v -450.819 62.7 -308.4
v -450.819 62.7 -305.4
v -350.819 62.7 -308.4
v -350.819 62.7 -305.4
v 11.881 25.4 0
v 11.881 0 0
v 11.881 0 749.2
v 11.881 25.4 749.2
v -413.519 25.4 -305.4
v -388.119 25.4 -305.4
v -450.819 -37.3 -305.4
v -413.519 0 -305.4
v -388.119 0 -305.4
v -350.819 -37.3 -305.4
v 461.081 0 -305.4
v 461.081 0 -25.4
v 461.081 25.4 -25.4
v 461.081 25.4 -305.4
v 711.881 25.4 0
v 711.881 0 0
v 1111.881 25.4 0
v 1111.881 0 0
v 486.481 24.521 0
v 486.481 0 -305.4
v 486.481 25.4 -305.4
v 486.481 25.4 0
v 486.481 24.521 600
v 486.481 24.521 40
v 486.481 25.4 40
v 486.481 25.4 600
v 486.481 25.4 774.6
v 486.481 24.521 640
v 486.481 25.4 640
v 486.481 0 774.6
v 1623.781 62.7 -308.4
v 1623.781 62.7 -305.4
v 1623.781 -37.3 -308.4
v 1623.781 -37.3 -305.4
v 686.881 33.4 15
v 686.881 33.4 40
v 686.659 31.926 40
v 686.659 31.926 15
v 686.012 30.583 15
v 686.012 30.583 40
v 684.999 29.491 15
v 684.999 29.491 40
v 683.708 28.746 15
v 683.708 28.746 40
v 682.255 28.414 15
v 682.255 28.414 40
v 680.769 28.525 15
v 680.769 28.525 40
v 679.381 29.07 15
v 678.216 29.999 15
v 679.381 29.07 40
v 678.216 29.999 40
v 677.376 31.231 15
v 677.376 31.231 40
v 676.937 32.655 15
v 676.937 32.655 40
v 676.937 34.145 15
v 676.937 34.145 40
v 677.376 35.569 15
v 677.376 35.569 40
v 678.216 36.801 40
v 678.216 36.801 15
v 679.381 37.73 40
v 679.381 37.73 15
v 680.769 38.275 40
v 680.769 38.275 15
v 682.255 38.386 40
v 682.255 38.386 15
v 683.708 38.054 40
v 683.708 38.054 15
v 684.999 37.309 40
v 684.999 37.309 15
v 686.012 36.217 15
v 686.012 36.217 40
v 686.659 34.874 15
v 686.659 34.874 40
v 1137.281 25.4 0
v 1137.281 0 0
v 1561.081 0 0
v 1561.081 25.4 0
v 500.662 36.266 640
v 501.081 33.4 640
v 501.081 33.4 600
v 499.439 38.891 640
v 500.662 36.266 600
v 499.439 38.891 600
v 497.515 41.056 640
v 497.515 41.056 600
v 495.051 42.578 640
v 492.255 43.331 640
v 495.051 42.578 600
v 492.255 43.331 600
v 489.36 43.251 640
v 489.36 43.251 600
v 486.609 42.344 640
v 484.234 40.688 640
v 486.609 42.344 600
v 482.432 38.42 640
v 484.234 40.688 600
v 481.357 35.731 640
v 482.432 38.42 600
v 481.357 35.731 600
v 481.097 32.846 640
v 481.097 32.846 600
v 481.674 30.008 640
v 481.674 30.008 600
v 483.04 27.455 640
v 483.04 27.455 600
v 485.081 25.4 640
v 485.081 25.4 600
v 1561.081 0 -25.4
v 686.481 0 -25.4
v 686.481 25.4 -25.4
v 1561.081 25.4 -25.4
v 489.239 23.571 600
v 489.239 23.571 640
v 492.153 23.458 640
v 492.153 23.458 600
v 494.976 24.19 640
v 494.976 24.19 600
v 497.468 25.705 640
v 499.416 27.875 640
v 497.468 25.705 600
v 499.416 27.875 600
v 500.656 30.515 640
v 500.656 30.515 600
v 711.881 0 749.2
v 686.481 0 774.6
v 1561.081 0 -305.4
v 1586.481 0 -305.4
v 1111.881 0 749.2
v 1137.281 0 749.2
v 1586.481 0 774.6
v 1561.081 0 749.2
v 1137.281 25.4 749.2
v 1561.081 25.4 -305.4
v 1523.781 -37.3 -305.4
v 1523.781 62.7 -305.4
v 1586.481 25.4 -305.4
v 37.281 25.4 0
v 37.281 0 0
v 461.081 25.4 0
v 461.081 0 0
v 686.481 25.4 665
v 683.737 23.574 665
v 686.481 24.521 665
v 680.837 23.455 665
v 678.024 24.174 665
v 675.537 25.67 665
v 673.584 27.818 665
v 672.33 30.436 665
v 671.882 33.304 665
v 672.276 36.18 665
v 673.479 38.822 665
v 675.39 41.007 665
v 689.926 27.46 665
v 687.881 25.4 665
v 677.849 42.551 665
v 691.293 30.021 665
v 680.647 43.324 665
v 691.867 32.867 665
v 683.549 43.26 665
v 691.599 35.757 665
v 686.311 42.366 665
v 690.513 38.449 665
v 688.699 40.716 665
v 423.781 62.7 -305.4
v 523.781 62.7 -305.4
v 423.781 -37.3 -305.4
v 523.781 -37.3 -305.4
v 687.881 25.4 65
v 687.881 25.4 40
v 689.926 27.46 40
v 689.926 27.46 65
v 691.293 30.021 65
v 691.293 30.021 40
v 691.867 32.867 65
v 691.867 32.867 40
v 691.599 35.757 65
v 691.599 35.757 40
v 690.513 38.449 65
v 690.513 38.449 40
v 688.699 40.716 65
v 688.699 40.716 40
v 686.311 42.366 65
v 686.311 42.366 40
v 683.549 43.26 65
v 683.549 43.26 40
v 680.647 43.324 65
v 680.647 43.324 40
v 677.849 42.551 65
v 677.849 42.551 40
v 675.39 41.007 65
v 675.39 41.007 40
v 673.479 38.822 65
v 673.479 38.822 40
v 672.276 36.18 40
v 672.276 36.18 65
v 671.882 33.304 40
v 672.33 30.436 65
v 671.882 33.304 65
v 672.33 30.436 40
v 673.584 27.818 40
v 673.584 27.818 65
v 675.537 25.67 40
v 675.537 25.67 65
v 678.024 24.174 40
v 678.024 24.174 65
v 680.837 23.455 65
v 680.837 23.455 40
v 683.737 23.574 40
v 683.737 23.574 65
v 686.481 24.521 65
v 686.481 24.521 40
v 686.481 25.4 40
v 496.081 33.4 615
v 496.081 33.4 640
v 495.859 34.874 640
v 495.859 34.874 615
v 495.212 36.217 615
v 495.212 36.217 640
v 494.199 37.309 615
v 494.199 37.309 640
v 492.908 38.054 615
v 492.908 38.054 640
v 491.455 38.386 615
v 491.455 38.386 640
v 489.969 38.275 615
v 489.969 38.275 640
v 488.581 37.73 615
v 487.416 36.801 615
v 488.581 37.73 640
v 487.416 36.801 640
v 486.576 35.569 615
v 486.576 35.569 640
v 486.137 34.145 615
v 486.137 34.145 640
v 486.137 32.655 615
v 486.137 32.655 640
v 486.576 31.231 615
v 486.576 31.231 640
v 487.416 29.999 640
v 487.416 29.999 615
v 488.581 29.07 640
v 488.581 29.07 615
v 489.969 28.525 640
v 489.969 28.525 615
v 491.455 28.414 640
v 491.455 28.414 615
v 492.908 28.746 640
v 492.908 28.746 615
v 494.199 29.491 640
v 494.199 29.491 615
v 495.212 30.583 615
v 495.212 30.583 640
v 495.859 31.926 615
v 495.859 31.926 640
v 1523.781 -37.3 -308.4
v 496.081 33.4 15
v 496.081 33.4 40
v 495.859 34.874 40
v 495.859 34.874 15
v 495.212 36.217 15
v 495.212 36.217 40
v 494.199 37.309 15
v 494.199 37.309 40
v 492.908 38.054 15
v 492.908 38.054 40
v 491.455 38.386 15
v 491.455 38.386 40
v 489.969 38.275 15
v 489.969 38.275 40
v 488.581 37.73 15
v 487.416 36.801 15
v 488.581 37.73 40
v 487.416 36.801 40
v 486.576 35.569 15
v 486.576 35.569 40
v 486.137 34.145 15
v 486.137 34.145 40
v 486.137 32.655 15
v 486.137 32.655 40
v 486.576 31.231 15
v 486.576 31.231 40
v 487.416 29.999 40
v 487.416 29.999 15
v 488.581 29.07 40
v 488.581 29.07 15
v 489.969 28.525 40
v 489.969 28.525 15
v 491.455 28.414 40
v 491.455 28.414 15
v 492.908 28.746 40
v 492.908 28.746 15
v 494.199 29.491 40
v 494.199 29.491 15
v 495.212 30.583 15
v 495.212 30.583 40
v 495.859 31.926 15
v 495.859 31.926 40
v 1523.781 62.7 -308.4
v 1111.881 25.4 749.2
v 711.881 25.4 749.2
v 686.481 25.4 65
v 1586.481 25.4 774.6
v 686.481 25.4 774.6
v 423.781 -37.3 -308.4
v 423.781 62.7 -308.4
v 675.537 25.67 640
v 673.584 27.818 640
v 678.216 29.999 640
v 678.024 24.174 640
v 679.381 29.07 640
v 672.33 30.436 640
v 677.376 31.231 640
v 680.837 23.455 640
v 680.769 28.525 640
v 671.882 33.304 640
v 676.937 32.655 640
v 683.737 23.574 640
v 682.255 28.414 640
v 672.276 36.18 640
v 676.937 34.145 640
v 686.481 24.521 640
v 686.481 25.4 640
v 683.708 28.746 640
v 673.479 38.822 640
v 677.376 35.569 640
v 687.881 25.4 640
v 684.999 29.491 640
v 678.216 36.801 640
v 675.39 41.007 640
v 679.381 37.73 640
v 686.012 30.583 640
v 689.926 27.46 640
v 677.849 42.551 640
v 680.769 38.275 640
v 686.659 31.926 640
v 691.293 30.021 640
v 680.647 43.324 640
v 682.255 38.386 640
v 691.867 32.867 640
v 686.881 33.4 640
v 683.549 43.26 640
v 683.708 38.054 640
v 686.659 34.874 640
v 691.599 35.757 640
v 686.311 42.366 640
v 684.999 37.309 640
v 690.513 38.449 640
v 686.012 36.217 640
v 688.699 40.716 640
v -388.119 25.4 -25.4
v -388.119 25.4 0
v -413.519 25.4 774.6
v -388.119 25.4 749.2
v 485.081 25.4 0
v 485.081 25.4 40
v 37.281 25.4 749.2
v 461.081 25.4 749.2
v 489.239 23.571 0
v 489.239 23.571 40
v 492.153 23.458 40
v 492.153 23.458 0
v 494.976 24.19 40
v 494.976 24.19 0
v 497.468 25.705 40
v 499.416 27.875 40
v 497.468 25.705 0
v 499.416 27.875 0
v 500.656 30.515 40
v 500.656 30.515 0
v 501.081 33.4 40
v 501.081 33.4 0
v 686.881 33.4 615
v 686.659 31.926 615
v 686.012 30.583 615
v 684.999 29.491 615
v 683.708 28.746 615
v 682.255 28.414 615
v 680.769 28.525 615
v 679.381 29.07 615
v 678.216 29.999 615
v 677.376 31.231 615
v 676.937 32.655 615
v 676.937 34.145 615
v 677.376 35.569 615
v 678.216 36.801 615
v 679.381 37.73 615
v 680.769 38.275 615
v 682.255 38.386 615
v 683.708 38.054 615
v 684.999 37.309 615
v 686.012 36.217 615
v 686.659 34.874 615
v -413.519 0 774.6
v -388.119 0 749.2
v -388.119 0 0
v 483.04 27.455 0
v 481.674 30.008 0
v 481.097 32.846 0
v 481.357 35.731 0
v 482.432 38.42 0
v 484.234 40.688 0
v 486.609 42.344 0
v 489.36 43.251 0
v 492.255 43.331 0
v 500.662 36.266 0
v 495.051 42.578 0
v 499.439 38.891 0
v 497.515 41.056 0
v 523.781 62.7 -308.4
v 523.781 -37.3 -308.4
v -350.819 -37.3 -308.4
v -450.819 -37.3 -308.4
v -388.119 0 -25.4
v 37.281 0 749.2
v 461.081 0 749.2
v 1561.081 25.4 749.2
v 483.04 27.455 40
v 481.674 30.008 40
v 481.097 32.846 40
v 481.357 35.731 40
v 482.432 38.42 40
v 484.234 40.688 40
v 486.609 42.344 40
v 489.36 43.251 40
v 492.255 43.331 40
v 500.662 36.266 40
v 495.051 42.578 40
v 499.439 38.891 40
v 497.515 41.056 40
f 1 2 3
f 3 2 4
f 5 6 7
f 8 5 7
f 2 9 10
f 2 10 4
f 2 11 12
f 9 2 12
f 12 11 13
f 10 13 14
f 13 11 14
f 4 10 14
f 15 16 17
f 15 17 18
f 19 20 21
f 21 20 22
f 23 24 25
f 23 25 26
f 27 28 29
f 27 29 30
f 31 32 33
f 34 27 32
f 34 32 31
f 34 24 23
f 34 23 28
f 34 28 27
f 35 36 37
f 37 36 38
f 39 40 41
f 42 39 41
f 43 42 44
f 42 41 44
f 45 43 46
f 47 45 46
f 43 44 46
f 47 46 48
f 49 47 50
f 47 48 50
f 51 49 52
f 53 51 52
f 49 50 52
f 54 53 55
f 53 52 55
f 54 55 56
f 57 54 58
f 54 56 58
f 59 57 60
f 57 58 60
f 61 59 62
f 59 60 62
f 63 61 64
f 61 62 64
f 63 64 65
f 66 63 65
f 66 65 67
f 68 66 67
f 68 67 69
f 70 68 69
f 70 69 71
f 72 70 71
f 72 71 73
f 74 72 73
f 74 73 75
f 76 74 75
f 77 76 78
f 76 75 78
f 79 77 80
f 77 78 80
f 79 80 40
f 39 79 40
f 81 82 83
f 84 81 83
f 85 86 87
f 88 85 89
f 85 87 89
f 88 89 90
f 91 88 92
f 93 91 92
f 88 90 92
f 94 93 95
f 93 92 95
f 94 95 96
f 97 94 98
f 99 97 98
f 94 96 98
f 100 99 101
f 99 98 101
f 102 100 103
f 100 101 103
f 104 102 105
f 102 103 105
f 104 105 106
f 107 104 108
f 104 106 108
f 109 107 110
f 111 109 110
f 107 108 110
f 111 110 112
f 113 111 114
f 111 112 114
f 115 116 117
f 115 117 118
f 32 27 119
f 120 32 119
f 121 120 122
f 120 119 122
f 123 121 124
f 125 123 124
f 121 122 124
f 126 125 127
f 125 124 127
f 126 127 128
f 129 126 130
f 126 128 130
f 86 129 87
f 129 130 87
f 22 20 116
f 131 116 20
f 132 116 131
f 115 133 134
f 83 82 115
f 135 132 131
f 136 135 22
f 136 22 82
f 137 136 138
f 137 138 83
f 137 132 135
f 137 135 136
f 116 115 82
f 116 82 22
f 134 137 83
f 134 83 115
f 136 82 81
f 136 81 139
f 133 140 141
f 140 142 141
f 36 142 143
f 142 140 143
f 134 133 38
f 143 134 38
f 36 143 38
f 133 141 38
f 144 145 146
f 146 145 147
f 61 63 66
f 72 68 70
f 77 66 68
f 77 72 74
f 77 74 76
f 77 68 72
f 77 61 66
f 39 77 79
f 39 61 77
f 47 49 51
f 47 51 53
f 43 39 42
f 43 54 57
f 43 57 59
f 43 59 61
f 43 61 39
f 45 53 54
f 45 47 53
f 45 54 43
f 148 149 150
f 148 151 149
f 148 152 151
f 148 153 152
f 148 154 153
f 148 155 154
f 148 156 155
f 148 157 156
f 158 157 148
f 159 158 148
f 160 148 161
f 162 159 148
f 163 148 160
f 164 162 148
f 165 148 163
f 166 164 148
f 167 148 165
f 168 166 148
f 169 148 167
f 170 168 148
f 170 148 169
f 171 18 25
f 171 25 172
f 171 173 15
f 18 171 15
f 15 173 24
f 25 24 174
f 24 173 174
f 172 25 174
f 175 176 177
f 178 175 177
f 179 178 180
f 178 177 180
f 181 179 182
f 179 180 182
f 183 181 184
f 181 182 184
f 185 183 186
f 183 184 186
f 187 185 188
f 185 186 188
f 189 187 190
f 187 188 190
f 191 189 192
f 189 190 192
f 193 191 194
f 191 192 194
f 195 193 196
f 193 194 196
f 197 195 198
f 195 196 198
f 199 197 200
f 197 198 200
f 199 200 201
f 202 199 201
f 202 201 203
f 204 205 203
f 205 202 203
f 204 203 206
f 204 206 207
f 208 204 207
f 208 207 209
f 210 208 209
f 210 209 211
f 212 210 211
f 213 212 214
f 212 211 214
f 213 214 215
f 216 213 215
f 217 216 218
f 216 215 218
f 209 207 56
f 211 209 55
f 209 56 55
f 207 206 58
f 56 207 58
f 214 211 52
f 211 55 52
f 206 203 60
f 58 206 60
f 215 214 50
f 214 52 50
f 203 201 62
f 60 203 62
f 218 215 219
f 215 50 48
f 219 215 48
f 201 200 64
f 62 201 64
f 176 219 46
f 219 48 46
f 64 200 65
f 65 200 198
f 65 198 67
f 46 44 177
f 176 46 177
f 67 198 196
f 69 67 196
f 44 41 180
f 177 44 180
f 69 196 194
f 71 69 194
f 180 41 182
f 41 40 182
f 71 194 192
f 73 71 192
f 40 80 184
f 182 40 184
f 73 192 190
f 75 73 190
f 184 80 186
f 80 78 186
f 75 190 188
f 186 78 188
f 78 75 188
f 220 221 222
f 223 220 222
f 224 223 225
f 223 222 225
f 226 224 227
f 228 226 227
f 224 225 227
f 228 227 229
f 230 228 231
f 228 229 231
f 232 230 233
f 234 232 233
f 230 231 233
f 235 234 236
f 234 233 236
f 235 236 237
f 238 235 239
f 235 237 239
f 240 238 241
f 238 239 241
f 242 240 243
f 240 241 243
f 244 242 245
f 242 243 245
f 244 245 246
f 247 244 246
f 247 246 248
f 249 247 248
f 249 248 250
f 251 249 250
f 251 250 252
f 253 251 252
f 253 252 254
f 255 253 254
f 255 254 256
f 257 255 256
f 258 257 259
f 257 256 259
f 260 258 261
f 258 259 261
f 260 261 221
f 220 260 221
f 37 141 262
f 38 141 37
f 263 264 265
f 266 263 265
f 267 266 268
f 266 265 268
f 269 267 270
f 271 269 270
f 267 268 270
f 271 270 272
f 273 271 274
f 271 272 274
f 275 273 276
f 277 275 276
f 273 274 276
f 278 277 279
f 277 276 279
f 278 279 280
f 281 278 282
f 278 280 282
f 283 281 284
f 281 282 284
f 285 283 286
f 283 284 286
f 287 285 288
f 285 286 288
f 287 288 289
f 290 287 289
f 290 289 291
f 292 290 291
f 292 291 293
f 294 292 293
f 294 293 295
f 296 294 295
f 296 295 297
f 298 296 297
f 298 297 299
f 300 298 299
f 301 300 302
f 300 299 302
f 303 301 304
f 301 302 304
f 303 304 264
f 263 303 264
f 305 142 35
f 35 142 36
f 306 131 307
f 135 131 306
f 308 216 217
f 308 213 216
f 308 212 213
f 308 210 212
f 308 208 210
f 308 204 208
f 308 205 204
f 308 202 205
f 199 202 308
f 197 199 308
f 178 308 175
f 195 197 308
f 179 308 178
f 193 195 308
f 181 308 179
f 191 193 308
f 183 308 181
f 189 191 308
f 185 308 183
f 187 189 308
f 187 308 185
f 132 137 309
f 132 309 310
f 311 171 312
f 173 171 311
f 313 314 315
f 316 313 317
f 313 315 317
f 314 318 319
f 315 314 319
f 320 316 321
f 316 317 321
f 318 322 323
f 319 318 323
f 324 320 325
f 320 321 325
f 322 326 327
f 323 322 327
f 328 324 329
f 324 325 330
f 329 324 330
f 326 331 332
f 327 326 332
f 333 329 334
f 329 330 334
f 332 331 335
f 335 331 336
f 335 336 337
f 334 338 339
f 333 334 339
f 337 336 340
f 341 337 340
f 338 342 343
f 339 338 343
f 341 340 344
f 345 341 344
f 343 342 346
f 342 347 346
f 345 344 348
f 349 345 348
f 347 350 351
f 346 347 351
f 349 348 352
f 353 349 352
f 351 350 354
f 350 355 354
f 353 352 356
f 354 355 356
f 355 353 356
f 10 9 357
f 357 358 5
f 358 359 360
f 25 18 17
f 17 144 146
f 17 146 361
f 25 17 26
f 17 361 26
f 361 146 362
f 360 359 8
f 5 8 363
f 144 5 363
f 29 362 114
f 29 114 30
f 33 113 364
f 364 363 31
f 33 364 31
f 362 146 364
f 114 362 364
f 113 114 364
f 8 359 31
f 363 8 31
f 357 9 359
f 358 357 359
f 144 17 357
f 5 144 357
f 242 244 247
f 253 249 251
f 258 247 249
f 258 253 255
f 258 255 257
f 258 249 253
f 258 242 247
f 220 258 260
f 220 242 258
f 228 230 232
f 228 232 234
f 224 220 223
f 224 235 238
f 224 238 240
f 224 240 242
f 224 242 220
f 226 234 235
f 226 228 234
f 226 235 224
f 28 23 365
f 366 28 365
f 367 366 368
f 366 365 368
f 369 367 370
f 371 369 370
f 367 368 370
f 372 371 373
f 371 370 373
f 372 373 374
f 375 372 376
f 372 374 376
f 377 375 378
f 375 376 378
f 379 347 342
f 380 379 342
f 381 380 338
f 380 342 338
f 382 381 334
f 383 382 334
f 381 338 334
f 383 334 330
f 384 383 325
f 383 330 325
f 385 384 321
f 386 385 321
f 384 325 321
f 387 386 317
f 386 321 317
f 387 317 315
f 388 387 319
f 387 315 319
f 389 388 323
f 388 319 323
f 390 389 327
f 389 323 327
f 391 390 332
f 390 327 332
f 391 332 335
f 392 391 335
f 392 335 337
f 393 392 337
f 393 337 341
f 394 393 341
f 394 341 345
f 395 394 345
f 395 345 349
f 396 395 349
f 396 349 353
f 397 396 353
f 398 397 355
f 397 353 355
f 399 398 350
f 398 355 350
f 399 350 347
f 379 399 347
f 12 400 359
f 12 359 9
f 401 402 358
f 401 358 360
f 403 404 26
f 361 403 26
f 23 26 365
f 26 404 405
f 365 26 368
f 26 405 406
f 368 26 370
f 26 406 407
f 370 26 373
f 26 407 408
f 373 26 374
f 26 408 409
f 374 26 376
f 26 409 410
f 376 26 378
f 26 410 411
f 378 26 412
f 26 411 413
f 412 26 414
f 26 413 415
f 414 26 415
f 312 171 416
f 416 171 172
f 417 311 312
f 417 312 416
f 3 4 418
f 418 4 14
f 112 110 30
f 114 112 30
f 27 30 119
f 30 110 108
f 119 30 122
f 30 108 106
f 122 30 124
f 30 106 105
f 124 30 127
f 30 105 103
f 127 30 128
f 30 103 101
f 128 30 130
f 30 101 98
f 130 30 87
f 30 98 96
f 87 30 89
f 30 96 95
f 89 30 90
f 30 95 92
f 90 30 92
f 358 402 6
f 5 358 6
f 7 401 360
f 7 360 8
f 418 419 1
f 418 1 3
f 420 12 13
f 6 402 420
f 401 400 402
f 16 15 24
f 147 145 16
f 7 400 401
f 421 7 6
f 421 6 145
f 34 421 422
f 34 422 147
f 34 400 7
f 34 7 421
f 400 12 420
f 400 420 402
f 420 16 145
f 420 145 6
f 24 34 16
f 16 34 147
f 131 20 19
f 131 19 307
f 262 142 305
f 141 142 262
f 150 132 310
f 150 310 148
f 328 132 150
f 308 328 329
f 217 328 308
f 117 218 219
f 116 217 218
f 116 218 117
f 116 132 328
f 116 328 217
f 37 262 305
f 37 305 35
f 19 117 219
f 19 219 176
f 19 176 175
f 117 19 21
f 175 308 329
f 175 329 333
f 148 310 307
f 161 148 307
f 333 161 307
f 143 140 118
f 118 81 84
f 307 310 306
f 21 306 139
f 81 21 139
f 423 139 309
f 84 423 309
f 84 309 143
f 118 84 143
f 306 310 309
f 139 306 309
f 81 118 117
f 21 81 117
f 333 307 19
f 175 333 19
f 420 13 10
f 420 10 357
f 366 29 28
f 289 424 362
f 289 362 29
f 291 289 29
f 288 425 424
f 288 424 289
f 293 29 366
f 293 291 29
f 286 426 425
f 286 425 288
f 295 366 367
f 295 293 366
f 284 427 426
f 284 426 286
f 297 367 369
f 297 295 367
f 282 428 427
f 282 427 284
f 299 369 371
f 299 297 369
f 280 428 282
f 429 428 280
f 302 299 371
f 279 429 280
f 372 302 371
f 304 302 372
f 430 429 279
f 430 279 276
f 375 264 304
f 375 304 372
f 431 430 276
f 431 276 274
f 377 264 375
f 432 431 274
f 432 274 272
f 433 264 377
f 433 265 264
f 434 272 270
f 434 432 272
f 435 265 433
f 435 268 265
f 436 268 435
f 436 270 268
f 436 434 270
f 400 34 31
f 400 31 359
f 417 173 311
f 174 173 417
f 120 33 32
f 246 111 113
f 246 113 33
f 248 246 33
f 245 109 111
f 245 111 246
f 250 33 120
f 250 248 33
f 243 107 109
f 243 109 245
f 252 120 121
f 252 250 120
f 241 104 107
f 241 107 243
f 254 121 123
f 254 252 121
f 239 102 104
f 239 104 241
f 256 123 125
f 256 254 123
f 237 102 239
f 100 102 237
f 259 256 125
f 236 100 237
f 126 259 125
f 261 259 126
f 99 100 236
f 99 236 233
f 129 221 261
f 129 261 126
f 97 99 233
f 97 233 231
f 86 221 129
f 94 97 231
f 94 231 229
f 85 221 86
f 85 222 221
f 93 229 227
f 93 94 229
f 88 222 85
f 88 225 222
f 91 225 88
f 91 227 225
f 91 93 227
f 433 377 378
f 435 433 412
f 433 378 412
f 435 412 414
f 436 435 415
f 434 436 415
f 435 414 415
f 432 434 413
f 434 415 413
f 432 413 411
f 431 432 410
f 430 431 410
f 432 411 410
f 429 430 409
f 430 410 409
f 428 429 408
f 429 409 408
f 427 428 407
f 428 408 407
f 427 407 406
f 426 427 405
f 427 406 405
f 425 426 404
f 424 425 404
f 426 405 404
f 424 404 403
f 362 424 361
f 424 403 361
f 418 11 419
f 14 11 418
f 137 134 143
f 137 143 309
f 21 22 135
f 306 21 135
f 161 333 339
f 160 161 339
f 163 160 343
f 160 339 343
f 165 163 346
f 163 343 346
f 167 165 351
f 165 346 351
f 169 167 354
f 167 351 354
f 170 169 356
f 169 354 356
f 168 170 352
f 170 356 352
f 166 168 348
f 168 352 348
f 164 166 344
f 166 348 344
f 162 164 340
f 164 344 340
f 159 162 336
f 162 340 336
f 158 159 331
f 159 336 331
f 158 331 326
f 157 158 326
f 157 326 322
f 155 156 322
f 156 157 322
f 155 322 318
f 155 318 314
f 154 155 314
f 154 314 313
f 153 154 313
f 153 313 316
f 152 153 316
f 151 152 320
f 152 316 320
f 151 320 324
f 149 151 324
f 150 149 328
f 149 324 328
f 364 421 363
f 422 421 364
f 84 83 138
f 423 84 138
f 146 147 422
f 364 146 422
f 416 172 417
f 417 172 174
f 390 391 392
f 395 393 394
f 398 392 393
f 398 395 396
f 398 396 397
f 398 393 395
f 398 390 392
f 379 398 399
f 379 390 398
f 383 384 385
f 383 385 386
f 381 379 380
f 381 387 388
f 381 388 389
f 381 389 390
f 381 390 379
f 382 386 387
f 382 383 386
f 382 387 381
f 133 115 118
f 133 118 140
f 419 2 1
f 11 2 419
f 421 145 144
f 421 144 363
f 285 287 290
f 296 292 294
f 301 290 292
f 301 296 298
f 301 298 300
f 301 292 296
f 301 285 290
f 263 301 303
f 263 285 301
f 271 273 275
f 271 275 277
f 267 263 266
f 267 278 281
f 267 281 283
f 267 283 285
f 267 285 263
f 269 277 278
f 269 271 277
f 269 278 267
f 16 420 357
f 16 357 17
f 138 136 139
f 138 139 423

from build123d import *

# Parameters (mm, degrees)
F0_W      = 400
F0_H      = 749.2
F0_W_2    = 423.8
F1_DEPTH  = 25.4
F2_W      = 100
F2_H      = 100
F3_DEPTH  = 3
F4_W      = 100
F4_H      = 100
F5_DEPTH  = 3
F6_R      = 10
F7_DEPTH  = 40
F8_R      = 5
F9_DEPTH  = 25
F11_R     = 10
F12_DEPTH = 40
F13_R     = 5
F14_DEPTH = 25
F17_R     = 10
F18_DEPTH = 25
F19_R     = 5
F20_DEPTH = 25
F21_R     = 10
F22_DEPTH = 25
F23_R     = 5
F24_DEPTH = 25


with BuildPart() as f1:
    # F0 (on Front) → F1 (new body)
    with BuildSketch(Plane.XZ):
        Polygon((486.4812463522, 774.6), (-413.5187536478, 774.6), (-413.5187536478, -305.4), (-388.1187536478, -305.4), (-388.1187536478, -25.4), (461.0812463522, -25.4), (461.0812463522, -305.4), (486.4812463522, -305.4), align=None)
        with Locations((-188.1187536478, 374.6)):
            Rectangle(F0_W, F0_H, mode=Mode.SUBTRACT)
        with Locations((249.1812463522, 374.6)):
            Rectangle(F0_W_2, F0_H, mode=Mode.SUBTRACT)
    extrude(amount=-F1_DEPTH)

    # F2 (on face) → F3 (join)
    with BuildSketch(Plane(origin=(0, 0, -305.4), x_dir=(1, 0, 0), z_dir=(0, 0, -1))):
        with Locations((-400.8187536478, -12.7)):
            Rectangle(F2_W, F2_H)
        with Locations((473.7812463522, -12.7)):
            Rectangle(F2_W, F2_H)
    extrude(amount=F3_DEPTH)

    # F6 (on face) → F7 (join)
    with BuildSketch(Plane.XY):
        with Locations((491.0812463522, 33.4)):
            Circle(F6_R)
    extrude(amount=F7_DEPTH)

    # F8 (on face) → F9 (cut)
    with BuildSketch(Plane.XY.offset(40)):
        with Locations((491.0812463522, 33.4)):
            Circle(F8_R)
    extrude(amount=-F9_DEPTH, mode=Mode.SUBTRACT)

    # F11 (on offset) → F12 (join)
    with BuildSketch(Plane.XY.offset(600)):
        with Locations((491.0812463522, 33.4)):
            Circle(F11_R)
    extrude(amount=F12_DEPTH)

    # F13 (on face) → F14 (cut)
    with BuildSketch(Plane.XY.offset(640)):
        with Locations((491.0812463522, 33.4)):
            Circle(F13_R)
    extrude(amount=-F14_DEPTH, mode=Mode.SUBTRACT)


with BuildPart() as f1b:
    # F0 (on Front) → F1, piece 2 (new body)
    with BuildSketch(Plane.XZ):
        Polygon((1586.4812463522, 774.6), (686.4812463522, 774.6), (686.4812463522, -25.4), (711.8812463522, -25.4), (1561.0812463522, -25.4), (1561.0812463522, -305.4), (1586.4812463522, -305.4), align=None)
        with Locations((911.8812463522, 374.6)):
            Rectangle(F0_W, F0_H, mode=Mode.SUBTRACT)
        with Locations((1349.1812463522, 374.6)):
            Rectangle(F0_W_2, F0_H, mode=Mode.SUBTRACT)
    extrude(amount=-F1_DEPTH)

    # F4 (on face) → F5 (join)
    with BuildSketch(Plane(origin=(0, 0, -305.4), x_dir=(1, 0, 0), z_dir=(0, 0, -1))):
        with Locations((1573.7812463522, -12.7)):
            Rectangle(F4_W, F4_H)
    extrude(amount=F5_DEPTH)

    # F17 (on offset) → F18 (join)
    with BuildSketch(Plane.XY.offset(40)):
        with Locations((681.8812463522, 33.4)):
            Circle(F17_R)
    extrude(amount=F18_DEPTH)

    # F19 (on face) → F20 (join)
    with BuildSketch(Plane(origin=(0, 0, 40), x_dir=(1, 0, 0), z_dir=(0, 0, -1))):
        with Locations((681.8812463522, -33.4)):
            Circle(F19_R)
    extrude(amount=F20_DEPTH)

    # F21 (on offset) → F22 (join)
    with BuildSketch(Plane.XY.offset(640)):
        with Locations((681.8812463522, 33.4)):
            Circle(F21_R)
    extrude(amount=F22_DEPTH)

    # F23 (on face) → F24 (join)
    with BuildSketch(Plane(origin=(0, 0, 640), x_dir=(1, 0, 0), z_dir=(0, 0, -1))):
        with Locations((681.8812463522, -33.4)):
            Circle(F23_R)
    extrude(amount=F24_DEPTH)


solid = Compound([f1.part, f1b.part])
